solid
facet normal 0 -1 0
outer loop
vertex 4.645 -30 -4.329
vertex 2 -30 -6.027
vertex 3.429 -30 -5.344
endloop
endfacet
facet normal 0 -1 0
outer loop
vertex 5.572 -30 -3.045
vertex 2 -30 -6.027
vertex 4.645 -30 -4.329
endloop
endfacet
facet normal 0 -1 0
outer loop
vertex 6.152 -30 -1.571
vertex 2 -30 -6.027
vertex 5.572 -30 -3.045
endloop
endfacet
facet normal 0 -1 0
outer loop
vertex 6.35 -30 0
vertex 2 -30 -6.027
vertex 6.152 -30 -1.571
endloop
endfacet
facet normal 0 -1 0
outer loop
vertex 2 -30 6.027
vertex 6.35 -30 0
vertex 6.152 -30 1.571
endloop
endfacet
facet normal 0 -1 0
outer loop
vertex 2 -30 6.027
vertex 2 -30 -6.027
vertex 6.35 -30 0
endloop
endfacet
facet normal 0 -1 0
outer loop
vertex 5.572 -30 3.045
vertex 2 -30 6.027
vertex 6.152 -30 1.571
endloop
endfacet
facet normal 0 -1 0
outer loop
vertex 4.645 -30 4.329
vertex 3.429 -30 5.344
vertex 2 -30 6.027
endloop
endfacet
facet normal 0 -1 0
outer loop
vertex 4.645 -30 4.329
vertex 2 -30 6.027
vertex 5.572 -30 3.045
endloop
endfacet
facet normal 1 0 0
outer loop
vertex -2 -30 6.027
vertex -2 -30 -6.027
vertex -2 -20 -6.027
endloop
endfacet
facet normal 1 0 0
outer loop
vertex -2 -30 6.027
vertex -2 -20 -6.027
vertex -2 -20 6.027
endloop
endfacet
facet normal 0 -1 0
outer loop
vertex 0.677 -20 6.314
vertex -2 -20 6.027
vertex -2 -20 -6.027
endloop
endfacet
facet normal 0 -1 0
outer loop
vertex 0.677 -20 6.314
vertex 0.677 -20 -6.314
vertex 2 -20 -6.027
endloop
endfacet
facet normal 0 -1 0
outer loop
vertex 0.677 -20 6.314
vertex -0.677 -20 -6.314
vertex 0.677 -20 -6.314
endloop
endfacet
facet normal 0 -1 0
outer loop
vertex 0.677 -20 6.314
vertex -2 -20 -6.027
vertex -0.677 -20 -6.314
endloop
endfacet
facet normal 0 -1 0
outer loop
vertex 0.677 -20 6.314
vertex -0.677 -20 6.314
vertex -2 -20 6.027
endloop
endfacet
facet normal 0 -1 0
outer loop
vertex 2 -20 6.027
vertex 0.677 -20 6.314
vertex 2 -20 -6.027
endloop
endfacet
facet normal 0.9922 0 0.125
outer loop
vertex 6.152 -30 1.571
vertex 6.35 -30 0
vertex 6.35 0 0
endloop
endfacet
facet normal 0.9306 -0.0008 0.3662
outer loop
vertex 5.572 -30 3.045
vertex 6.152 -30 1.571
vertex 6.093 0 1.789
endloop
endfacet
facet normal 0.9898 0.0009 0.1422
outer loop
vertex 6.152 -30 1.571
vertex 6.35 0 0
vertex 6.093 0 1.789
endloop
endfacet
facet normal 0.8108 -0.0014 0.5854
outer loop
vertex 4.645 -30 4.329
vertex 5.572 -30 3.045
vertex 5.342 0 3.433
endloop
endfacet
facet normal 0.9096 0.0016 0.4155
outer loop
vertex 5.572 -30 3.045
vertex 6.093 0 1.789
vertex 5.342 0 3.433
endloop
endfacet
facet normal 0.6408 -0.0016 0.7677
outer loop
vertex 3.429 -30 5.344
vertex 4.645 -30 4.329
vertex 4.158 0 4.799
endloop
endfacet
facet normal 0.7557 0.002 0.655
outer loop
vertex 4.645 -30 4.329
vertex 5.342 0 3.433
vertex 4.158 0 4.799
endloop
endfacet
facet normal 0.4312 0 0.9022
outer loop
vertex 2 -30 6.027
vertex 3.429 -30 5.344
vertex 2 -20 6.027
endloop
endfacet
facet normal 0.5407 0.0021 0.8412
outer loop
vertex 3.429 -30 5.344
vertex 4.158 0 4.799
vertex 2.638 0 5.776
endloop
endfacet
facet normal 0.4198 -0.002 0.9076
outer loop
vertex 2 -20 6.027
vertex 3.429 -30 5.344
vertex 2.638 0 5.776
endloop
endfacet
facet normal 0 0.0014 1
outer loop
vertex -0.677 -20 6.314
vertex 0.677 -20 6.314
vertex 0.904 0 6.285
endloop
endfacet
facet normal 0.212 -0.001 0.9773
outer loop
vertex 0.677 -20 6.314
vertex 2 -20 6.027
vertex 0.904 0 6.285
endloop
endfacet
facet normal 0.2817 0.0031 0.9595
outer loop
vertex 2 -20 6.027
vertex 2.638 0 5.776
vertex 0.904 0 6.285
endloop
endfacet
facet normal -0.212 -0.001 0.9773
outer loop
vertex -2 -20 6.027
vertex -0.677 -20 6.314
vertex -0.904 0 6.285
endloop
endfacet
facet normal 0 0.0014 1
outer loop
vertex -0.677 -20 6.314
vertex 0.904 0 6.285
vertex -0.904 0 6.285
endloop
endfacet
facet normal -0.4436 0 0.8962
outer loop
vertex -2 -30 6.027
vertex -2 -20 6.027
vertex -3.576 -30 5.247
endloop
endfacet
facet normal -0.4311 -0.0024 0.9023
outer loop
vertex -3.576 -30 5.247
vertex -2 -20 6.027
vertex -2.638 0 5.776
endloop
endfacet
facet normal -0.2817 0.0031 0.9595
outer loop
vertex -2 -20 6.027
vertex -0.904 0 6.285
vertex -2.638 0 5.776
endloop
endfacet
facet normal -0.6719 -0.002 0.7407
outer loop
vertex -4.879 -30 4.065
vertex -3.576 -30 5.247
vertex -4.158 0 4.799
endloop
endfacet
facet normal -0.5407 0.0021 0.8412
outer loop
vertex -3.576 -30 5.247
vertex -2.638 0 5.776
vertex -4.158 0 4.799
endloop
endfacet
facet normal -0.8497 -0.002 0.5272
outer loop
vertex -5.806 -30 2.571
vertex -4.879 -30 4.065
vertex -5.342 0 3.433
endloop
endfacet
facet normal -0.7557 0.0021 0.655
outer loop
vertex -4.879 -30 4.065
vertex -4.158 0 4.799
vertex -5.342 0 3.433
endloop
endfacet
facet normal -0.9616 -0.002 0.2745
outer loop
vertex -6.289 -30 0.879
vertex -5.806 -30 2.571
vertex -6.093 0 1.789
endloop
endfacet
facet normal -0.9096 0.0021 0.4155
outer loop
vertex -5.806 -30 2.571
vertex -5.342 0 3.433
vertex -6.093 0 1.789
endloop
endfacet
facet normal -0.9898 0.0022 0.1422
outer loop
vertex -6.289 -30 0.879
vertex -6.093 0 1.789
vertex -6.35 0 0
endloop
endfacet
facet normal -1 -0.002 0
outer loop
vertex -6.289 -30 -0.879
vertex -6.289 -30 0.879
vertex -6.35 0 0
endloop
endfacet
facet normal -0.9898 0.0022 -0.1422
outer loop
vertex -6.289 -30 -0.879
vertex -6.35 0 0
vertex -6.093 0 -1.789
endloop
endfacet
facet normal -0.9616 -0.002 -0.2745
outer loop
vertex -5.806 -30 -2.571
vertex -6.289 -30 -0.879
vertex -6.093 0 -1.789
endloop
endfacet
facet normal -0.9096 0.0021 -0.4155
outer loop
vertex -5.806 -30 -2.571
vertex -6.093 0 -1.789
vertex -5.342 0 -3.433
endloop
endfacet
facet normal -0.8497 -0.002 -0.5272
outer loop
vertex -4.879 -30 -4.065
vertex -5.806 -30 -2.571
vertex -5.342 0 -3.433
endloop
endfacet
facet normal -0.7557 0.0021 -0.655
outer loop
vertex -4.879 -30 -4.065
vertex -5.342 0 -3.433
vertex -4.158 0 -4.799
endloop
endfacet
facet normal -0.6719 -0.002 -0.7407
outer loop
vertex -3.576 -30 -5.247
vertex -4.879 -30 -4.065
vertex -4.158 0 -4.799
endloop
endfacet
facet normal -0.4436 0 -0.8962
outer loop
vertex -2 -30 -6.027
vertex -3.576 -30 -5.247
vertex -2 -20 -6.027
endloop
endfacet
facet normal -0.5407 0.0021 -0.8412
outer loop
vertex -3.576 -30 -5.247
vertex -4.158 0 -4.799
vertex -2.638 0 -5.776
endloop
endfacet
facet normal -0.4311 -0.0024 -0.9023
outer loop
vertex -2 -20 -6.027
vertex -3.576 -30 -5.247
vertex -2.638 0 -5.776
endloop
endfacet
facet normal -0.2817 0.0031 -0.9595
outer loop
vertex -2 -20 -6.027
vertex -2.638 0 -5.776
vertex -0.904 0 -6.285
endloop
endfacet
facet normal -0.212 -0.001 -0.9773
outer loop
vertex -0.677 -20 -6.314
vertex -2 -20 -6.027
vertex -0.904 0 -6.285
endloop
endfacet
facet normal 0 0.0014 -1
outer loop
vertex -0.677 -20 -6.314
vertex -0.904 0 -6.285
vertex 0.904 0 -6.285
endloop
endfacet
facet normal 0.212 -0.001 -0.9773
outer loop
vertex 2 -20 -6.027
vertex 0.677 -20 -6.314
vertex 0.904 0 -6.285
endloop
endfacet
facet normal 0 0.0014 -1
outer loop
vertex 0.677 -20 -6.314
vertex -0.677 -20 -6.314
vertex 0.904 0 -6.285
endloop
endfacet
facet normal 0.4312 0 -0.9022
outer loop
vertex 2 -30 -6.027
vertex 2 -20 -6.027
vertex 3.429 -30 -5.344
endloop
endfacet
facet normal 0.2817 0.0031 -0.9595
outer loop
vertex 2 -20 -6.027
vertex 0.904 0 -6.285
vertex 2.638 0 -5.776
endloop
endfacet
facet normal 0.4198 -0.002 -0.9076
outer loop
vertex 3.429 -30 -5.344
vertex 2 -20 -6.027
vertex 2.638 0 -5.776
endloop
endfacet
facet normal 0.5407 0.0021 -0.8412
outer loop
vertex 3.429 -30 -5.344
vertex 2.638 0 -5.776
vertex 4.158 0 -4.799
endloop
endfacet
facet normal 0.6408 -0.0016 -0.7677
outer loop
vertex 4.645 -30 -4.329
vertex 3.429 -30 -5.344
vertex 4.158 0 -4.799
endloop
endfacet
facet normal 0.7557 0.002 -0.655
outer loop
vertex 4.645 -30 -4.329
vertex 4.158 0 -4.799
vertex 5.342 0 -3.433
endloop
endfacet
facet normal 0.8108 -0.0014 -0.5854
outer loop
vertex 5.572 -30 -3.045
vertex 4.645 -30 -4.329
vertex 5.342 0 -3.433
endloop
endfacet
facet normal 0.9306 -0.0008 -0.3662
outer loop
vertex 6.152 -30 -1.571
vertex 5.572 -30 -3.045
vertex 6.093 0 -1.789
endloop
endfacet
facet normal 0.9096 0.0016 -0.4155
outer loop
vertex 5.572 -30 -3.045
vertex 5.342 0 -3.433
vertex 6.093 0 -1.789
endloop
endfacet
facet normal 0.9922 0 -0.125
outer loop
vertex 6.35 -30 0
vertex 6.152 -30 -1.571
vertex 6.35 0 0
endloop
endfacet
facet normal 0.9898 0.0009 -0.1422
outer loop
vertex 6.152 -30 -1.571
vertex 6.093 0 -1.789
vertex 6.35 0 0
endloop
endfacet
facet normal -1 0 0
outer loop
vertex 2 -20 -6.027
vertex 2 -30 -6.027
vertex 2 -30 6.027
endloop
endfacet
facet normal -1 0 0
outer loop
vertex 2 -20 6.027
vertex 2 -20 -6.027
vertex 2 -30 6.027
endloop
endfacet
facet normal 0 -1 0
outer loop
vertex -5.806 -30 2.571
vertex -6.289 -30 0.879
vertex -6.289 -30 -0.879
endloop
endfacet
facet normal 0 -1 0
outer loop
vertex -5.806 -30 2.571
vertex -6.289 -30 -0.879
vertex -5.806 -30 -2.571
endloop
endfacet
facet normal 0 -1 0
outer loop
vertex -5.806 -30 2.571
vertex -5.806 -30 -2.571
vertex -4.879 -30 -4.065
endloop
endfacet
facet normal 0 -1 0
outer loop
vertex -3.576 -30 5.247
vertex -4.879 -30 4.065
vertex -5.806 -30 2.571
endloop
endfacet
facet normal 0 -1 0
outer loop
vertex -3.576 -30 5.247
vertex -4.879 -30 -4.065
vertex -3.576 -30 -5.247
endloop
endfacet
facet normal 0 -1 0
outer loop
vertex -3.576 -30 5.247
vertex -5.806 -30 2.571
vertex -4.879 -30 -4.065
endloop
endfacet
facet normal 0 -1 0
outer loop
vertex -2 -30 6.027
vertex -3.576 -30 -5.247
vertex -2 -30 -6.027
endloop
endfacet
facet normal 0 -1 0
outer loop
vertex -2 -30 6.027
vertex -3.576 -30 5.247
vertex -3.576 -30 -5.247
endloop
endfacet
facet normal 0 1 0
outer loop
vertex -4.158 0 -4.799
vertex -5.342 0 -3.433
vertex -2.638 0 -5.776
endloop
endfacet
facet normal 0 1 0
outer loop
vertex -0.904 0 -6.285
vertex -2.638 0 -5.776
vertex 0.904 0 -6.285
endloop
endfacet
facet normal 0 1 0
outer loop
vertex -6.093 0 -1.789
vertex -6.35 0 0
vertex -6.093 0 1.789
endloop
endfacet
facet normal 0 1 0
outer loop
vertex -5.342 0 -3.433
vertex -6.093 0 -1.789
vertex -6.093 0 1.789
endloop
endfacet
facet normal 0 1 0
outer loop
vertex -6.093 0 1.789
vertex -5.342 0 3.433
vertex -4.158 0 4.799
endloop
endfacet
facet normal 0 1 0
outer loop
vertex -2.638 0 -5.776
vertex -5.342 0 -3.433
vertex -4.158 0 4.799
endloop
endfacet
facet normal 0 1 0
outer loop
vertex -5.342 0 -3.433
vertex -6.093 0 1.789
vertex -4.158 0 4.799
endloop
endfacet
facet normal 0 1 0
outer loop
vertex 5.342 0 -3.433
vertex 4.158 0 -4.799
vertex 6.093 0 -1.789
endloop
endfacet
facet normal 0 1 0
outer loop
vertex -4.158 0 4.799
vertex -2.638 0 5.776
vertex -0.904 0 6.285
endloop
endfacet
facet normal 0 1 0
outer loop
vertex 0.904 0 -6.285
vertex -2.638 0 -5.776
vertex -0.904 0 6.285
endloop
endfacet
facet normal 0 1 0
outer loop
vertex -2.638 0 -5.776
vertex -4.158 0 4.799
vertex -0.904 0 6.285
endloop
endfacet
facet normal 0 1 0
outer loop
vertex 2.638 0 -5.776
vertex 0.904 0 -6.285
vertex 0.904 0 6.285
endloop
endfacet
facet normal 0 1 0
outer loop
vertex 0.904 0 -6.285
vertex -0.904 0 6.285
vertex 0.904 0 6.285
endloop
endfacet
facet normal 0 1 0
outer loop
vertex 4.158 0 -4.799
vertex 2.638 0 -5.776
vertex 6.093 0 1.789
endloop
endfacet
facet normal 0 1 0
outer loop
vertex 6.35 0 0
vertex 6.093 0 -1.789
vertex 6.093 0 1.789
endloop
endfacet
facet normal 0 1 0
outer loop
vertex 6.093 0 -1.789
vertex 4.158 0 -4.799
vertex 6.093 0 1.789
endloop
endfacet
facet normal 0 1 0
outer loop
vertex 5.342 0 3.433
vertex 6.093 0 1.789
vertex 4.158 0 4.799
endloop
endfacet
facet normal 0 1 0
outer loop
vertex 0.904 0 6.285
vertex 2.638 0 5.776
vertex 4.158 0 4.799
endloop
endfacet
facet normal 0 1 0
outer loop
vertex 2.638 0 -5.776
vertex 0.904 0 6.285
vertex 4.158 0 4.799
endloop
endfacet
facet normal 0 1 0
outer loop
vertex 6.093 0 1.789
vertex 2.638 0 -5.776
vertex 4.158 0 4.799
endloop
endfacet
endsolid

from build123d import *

# Parameters (mm, degrees)
F0_R     = 6.35
F1_DEPTH = 30
F2_W     = 4
F2_H     = 16.105262
F3_DEPTH = 10


with BuildPart() as f1:
    # F0 (on Front) → F1 (new body)
    with BuildSketch(Plane.XZ):
        Circle(F0_R)
    extrude(amount=F1_DEPTH)

    # F2 (on face) → F3 (cut)
    with BuildSketch(Plane.XZ.offset(30)):
        Rectangle(F2_W, F2_H)
    extrude(amount=-F3_DEPTH, mode=Mode.SUBTRACT)


solid = f1.part
